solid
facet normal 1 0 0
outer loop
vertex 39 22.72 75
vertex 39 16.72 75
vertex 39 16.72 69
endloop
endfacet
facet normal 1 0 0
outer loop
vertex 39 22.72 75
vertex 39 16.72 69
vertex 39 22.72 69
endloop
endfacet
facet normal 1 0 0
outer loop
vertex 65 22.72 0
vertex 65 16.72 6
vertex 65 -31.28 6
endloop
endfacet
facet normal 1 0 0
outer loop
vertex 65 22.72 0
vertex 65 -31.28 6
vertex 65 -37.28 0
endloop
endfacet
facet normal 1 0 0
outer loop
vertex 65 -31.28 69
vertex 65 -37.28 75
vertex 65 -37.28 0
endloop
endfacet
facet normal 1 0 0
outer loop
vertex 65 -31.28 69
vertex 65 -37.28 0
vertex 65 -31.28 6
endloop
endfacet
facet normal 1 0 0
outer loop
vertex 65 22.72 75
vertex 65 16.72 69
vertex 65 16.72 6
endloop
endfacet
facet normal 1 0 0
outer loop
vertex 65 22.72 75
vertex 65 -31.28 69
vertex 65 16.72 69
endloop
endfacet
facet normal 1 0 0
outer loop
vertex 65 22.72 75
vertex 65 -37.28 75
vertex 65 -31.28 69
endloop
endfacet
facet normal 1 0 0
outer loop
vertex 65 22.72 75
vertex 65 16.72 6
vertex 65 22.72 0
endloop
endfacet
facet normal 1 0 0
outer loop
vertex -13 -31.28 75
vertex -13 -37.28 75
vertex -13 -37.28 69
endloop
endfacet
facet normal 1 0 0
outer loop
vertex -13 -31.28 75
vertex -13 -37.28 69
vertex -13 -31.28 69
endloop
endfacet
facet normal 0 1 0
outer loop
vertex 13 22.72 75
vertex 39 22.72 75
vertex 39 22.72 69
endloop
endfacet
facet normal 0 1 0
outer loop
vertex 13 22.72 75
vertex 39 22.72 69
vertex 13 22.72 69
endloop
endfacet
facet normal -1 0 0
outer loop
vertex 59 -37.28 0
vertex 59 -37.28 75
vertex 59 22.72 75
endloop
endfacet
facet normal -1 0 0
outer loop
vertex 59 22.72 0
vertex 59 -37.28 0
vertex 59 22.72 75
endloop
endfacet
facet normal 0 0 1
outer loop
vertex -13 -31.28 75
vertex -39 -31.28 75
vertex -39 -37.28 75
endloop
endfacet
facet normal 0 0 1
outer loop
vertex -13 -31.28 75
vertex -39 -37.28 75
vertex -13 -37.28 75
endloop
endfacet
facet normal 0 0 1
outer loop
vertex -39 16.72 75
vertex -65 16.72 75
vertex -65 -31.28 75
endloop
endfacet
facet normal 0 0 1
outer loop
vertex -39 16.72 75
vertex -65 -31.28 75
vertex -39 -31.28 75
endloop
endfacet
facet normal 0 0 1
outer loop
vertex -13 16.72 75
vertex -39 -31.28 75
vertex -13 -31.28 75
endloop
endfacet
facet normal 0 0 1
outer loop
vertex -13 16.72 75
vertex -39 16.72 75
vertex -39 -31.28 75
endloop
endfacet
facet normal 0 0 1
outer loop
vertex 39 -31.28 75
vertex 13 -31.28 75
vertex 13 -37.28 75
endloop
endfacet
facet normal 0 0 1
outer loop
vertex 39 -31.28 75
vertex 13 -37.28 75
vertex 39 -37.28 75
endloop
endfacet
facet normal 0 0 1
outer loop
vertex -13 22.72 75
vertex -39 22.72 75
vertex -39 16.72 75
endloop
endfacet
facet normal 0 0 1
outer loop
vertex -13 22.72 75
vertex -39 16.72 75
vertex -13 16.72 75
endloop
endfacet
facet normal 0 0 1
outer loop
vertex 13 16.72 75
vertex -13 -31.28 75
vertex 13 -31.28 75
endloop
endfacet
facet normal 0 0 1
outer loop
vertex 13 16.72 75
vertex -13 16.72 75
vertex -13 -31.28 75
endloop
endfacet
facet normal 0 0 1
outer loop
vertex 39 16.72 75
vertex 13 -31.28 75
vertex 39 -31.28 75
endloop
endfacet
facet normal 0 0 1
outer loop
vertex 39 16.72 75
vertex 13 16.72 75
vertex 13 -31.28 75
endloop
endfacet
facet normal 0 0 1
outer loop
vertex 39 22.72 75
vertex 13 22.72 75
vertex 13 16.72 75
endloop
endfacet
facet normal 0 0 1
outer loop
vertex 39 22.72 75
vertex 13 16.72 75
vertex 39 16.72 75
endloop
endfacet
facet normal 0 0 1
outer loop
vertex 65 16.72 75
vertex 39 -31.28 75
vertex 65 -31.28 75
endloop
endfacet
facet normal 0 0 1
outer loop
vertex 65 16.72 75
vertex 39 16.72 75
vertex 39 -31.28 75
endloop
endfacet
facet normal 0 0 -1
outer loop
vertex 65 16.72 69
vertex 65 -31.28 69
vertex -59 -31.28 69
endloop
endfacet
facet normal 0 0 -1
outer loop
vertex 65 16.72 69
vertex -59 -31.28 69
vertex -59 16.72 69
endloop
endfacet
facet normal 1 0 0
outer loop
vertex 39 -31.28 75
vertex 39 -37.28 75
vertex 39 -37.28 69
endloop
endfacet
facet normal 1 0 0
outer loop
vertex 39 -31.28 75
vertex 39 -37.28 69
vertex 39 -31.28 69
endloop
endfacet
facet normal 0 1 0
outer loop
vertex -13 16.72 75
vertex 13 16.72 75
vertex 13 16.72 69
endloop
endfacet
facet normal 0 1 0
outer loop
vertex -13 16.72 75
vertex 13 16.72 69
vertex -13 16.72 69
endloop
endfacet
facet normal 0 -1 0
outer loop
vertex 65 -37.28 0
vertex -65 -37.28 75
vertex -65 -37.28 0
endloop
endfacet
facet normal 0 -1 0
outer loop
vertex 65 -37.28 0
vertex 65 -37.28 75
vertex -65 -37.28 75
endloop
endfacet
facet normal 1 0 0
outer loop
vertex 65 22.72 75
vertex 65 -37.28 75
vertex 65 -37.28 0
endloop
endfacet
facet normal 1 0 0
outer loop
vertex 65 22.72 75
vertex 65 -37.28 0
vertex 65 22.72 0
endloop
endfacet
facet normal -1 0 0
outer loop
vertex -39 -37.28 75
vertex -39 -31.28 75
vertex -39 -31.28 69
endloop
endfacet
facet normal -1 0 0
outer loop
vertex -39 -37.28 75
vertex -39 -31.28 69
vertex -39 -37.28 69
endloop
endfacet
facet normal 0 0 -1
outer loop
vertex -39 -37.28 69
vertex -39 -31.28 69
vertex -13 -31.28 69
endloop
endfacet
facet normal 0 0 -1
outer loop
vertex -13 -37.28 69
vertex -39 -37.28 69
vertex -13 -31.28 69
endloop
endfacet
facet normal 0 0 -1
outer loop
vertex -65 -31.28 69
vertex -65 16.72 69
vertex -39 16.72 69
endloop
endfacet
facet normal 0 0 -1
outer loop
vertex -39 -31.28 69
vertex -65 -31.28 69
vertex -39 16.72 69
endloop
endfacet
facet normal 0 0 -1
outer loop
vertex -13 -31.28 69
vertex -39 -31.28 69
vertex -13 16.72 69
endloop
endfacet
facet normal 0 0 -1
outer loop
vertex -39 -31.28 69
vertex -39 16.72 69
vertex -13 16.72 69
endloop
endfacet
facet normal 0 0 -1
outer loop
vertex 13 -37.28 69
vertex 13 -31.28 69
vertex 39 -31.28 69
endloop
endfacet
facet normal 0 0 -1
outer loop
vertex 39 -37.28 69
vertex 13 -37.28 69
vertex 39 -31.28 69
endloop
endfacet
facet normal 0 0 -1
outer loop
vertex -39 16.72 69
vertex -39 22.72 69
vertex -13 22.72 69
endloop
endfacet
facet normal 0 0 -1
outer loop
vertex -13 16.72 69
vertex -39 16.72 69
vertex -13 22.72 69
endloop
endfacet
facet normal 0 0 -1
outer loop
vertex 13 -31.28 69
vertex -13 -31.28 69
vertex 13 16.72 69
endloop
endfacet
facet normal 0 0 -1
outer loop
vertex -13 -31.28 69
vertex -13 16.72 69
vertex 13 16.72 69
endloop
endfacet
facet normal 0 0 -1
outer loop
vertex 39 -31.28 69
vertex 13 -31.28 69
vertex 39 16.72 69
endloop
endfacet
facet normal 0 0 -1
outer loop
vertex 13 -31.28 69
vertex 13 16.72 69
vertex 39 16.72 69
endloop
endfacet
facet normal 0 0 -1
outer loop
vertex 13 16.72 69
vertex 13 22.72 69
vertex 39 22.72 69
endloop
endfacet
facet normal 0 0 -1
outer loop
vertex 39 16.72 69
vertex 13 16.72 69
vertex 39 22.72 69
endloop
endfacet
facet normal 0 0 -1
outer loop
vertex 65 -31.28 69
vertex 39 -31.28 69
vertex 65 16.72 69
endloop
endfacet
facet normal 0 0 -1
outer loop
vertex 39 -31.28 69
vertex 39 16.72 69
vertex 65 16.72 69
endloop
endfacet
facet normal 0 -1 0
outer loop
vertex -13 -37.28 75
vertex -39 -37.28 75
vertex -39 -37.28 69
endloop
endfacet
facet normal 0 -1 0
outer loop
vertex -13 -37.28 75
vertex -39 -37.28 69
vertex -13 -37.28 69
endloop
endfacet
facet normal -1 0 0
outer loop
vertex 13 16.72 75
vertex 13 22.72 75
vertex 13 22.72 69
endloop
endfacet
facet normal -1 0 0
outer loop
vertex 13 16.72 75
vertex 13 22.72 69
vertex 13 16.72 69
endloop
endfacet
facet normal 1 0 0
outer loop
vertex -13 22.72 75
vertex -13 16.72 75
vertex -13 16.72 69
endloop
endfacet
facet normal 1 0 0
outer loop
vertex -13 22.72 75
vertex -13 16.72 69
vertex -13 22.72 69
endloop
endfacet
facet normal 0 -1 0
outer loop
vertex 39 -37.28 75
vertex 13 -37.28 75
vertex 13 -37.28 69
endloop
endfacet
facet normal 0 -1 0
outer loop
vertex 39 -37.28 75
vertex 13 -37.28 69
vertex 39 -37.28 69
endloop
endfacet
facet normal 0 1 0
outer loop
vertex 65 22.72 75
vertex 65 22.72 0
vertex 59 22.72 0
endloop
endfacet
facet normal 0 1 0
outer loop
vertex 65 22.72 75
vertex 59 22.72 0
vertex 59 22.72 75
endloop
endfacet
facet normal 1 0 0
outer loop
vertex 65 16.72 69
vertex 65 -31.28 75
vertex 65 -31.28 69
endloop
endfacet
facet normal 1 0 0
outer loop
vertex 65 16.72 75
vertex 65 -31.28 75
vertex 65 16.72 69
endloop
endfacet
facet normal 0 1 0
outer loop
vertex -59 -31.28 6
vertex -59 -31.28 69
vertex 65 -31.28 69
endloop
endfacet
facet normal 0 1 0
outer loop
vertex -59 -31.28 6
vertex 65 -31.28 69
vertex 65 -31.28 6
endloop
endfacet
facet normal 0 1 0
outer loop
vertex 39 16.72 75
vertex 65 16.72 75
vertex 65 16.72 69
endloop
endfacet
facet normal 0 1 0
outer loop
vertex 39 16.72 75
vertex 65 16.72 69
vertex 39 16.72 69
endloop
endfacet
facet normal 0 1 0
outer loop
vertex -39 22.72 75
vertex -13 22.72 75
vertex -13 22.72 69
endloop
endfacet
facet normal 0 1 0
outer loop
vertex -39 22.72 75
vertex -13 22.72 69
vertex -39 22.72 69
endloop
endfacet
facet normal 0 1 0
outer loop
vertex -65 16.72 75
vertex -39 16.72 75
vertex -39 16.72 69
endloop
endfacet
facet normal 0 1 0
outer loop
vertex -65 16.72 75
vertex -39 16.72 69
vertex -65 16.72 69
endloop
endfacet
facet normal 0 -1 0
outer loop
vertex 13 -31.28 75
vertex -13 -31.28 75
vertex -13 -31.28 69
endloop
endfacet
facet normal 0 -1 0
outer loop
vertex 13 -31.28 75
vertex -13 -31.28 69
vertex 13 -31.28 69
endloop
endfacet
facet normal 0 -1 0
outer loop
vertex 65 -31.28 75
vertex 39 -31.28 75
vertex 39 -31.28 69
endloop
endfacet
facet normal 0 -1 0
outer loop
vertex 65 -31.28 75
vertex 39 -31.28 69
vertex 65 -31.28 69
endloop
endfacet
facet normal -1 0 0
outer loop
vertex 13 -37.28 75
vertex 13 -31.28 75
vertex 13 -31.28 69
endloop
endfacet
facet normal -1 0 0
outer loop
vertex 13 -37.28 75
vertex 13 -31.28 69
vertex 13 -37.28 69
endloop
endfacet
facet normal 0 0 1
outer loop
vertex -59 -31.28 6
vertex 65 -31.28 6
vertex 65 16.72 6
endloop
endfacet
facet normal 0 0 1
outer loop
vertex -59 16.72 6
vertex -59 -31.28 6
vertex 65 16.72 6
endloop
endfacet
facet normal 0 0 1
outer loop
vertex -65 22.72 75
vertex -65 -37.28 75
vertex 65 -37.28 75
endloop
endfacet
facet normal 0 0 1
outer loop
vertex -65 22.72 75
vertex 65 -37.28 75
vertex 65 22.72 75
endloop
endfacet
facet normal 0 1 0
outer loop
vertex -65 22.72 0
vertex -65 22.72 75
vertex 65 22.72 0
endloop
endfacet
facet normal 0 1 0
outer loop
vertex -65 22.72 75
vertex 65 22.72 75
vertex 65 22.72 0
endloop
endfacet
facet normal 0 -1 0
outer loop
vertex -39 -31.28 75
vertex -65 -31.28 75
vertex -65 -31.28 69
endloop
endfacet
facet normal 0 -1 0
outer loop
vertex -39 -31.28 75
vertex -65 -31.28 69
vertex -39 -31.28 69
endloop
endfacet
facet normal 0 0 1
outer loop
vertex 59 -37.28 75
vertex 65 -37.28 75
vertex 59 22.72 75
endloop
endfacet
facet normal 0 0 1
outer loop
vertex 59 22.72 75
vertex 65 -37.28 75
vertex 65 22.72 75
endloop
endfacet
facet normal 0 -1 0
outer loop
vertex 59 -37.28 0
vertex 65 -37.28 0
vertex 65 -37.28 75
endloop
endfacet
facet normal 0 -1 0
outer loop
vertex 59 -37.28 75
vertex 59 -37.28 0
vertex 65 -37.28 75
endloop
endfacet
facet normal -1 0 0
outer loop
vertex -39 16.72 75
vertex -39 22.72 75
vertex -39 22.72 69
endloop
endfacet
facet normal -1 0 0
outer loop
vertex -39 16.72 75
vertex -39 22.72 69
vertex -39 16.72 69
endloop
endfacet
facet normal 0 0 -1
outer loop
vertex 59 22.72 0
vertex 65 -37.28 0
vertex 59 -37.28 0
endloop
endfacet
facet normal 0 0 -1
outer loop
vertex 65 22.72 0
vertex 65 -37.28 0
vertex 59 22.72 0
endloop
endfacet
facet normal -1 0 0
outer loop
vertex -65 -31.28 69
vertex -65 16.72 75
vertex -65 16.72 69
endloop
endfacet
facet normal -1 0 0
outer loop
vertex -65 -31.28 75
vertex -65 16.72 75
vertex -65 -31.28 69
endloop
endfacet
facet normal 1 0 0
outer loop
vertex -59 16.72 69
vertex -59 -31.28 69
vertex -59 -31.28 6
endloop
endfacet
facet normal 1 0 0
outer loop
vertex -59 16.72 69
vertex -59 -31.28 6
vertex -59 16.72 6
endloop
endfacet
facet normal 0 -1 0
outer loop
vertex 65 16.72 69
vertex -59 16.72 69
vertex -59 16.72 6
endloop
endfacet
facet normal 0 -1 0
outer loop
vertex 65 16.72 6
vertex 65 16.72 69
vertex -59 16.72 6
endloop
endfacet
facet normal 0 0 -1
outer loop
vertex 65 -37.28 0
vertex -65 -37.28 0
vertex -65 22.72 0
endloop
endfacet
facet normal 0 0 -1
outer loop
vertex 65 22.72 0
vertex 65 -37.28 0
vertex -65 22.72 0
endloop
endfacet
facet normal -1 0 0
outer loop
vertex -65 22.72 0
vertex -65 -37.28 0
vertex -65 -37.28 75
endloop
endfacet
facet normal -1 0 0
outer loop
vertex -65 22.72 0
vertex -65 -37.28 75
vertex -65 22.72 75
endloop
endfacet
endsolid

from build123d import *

# Parameters (mm, degrees)
F0_W      = 60
F0_H      = 75
F1_DEPTH  = 65
F1_FACE_W = 60
F1_FACE_H = 75
F2_DEPTH  = 65
F3_T      = -6
F5_DEPTH  = 6
F6_W      = 60
F6_H      = 75
F7_DEPTH  = 6


with BuildPart() as f1:
    # F0 (on Right) → F1 (new body)
    with BuildSketch(Plane.YZ):
        with Locations((-7.280336, 37.5)):
            Rectangle(F0_W, F0_H)
    extrude(amount=F1_DEPTH)

    # F1_face (on face) → F2 (join)
    with BuildSketch(Plane(origin=(0, -7.280336, 37.5), x_dir=(0, 1, 0), z_dir=(-1, 0, 0))):
        Rectangle(F1_FACE_W, F1_FACE_H)
    extrude(amount=F2_DEPTH)

    # F3
    f3_openings = [f1.faces().sort_by_distance(p)[0] for p in [
        (65, -7.280336, 37.5),
    ]]
    offset(amount=F3_T, openings=f3_openings)


with BuildPart() as f5:
    # F4 (on face) → F5 (new body)
    with BuildSketch(Plane.XY.offset(75)):
        Polygon((-13, 22.719664), (-39, 22.719664), (-39, 16.719664), (-65, 16.719664), (-65, -31.280336), (-39, -31.280336), (-39, -37.280336), (-13, -37.280336), (-13, -31.280336), (13, -31.280336), (13, -37.280336), (39, -37.280336), (39, -31.280336), (65, -31.280336), (65, 16.719664), (39, 16.719664), (39, 22.719664), (13, 22.719664), (13, 16.719664), (-13, 16.719664), align=None)
    extrude(amount=-F5_DEPTH)


with BuildPart() as f7:
    # F6 (on face) → F7 (new body)
    with BuildSketch(Plane.YZ.offset(65)):
        with Locations((-7.280336, 37.5)):
            Rectangle(F6_W, F6_H)
    extrude(amount=-F7_DEPTH)


solid = Compound([f1.part, f5.part, f7.part])
